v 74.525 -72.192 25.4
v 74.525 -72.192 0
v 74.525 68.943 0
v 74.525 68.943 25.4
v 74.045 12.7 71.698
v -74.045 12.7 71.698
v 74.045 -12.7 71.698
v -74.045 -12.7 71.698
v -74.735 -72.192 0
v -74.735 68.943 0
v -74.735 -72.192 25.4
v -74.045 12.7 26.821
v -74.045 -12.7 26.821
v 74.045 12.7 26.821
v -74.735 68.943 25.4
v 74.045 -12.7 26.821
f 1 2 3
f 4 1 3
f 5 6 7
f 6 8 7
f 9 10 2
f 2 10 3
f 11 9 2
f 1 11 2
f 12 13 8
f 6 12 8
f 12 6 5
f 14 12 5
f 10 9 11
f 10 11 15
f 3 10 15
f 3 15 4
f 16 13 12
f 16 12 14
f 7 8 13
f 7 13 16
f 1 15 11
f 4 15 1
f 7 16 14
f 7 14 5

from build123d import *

# Parameters (mm, degrees)
F0_W     = 149.260514
F0_H     = 141.135097
F1_DEPTH = 25.4
F2_W     = 148.089394
F2_H     = 44.877269
F3_DEPTH = 12.7


with BuildPart() as f1:
    # F0 (on Top) → F1 (new body)
    with BuildSketch(Plane.XY):
        with Locations((-0.104774, -1.624555)):
            Rectangle(F0_W, F0_H)
    extrude(amount=F1_DEPTH)


with BuildPart() as f3:
    # F2 (on Front) → F3 (new body, symmetric)
    with BuildSketch(Plane.XZ):
        with Locations((-7e-06, 49.259338)):
            Rectangle(F2_W, F2_H)
    extrude(amount=F3_DEPTH, both=True)


solid = Compound([f1.part, f3.part])
